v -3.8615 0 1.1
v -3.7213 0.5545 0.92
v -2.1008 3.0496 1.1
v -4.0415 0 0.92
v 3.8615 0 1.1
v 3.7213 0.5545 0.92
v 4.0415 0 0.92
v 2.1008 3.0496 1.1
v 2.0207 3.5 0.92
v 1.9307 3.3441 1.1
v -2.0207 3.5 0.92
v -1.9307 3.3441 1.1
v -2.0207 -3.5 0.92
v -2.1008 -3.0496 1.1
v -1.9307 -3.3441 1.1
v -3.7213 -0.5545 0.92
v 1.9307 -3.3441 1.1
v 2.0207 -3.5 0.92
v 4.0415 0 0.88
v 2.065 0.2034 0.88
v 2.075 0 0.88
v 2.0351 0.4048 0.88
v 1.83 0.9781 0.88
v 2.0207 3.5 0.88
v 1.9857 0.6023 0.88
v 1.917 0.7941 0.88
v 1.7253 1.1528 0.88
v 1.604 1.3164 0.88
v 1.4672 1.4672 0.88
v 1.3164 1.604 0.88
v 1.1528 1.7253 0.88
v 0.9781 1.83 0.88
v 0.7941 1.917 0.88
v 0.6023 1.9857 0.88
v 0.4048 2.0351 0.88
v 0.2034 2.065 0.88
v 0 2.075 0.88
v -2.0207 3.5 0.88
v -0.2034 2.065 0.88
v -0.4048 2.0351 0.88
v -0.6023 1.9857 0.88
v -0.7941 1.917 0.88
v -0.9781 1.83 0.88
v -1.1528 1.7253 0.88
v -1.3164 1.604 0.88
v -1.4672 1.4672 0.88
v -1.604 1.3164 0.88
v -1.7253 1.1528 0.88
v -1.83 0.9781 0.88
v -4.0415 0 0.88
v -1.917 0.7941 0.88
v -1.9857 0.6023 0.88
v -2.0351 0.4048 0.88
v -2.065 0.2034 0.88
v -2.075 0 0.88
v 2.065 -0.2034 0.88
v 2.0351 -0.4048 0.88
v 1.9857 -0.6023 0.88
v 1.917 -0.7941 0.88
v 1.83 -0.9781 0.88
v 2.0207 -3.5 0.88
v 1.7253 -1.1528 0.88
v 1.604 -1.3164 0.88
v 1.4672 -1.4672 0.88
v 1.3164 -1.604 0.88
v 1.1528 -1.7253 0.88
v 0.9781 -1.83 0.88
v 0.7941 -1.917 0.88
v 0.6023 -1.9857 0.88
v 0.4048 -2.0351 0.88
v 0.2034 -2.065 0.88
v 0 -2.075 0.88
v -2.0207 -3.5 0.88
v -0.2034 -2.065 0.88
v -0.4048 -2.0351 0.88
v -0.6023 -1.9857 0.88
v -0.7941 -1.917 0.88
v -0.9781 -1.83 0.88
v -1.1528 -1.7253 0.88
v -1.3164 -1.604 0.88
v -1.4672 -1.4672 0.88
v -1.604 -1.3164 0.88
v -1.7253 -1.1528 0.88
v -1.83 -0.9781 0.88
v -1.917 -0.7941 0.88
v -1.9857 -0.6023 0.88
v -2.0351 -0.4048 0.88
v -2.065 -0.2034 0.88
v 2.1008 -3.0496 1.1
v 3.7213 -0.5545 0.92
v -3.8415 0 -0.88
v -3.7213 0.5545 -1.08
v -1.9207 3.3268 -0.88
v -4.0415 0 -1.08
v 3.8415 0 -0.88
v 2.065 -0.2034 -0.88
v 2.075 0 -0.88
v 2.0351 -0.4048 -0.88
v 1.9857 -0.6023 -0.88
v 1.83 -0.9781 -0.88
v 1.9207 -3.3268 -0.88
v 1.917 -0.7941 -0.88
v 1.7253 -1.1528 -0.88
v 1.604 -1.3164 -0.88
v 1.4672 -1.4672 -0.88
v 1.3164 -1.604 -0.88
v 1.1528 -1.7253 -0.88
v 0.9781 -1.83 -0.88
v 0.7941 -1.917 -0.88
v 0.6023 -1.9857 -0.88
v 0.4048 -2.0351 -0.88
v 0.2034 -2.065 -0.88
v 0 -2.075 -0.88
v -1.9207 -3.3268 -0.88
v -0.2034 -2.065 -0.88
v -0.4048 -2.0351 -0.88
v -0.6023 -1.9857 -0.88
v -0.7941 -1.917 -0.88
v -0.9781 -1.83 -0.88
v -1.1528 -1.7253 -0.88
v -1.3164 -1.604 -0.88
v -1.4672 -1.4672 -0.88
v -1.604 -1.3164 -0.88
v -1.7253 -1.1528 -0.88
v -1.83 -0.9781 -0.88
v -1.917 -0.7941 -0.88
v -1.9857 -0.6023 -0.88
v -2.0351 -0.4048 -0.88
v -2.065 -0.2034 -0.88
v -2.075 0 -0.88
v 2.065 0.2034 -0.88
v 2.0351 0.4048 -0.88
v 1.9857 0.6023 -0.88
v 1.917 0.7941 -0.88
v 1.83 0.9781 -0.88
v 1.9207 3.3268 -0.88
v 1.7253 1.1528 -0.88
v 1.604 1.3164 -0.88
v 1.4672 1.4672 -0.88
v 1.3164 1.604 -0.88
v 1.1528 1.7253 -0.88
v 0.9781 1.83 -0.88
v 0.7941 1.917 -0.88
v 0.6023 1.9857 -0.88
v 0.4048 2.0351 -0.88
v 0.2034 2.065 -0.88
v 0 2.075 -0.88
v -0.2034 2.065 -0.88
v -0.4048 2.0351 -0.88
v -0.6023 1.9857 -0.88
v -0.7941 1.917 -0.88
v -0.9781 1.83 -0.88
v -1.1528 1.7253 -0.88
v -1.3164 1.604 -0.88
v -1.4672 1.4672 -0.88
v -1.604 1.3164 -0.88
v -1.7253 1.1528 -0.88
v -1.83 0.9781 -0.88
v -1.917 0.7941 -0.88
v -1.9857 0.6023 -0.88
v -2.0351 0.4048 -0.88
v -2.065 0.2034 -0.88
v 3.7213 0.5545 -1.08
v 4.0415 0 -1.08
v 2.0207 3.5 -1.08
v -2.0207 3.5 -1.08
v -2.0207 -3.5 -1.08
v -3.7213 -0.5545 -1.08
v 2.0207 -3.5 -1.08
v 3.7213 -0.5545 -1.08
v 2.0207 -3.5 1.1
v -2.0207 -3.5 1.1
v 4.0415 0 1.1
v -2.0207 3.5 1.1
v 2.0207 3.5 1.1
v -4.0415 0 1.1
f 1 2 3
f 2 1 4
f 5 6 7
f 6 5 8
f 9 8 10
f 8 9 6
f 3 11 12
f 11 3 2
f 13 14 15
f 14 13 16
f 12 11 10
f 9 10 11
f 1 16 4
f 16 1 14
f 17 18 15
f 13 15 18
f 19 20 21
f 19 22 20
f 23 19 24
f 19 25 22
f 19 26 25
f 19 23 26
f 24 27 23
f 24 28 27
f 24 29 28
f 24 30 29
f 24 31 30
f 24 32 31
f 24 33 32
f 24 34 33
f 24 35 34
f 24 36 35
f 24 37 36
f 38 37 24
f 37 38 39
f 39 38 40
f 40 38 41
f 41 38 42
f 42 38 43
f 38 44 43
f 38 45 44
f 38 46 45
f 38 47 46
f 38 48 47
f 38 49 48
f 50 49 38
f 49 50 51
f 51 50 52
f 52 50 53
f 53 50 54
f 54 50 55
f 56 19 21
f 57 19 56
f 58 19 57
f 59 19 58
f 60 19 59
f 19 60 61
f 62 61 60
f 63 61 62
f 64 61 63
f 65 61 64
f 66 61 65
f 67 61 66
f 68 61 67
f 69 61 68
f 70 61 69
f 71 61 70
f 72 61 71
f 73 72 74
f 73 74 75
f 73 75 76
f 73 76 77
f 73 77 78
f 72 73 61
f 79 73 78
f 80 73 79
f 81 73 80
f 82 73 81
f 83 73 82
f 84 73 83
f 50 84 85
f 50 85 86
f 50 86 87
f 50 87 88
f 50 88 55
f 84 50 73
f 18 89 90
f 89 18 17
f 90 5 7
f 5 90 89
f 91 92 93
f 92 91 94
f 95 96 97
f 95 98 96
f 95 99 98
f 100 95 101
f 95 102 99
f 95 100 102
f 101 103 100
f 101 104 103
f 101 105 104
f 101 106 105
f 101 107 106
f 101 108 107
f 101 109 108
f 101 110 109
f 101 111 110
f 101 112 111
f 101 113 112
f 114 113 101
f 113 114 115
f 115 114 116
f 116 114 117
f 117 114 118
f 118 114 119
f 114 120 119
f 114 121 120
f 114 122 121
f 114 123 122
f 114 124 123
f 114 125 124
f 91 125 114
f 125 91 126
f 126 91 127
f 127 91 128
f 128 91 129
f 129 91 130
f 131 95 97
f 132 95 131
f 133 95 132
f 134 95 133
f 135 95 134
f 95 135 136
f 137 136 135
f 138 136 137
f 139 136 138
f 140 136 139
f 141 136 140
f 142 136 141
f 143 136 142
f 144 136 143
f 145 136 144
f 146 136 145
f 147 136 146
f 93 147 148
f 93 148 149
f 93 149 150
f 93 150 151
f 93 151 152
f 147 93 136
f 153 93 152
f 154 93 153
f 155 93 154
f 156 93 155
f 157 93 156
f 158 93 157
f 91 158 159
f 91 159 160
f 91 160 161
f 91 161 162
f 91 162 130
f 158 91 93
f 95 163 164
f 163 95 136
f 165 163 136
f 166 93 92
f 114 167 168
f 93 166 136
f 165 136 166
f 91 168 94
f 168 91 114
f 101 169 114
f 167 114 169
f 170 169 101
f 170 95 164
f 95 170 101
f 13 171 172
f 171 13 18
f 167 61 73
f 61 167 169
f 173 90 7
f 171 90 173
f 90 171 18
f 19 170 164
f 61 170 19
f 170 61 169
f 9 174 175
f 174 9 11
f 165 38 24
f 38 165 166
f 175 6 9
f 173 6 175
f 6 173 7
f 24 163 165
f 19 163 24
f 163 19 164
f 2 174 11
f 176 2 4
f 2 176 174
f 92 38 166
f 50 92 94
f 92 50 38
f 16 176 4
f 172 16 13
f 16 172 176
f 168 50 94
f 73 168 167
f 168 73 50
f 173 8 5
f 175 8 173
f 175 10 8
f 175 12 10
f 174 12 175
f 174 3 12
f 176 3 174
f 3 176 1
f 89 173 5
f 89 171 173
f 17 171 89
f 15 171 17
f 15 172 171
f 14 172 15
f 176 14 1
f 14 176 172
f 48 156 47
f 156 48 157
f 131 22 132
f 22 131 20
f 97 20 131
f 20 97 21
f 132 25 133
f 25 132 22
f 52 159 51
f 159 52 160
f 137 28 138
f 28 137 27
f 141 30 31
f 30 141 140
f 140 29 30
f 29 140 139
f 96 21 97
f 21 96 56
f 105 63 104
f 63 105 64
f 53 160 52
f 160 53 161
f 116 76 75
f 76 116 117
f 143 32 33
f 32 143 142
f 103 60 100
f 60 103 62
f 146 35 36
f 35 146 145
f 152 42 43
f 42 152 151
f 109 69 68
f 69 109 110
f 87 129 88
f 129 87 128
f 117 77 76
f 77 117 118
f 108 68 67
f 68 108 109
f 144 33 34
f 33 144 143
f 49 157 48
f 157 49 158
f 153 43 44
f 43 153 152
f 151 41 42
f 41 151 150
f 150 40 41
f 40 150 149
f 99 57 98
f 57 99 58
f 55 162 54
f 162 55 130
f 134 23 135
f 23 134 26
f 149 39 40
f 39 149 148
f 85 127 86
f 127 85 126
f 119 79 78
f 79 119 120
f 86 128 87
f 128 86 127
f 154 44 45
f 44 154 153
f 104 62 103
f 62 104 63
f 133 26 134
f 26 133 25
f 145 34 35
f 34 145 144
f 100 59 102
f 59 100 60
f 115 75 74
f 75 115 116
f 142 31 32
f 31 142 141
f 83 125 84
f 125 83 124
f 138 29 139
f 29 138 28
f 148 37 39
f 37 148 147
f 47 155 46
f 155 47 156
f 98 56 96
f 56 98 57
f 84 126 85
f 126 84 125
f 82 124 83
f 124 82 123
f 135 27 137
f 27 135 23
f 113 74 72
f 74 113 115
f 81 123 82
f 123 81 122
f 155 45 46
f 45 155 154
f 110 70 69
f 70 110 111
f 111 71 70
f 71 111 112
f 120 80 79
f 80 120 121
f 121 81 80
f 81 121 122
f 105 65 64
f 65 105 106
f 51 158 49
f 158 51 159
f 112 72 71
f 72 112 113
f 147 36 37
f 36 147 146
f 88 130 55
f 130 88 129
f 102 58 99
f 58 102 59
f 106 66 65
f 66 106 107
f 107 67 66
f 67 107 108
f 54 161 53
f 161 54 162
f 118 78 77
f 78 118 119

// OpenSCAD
// Thin hex nut: M4 (4.0mm screw), 7.0mm across flats, 2.2mm thick

thread_nominal_diameter_mm = 4.0;   //[2.0:8.0:0.1]
across_flats_mm           = 7.0;   //[3.5:14.0:0.1]
thickness_mm              = 2.2;   //[1.1:4.4:0.1]
tolerance_mm              = 0.15;  //[0.05:0.4:0.01]
edge_chamfer_mm           = 0.2;   //[0.0:0.6:0.05]
eps_mm                    = 0.02;  //[0.01:0.2:0.01]

// Derived geometry
hex_inradius_mm      = across_flats_mm / 2;                 // center to flat
hex_circumradius_mm  = hex_inradius_mm / cos(30);           // center to corner
hole_diameter_mm     = thread_nominal_diameter_mm + tolerance_mm;

module hex_prism(h) {
    // Use built-in 6-sided cylinder; r is circumradius
    cylinder(h = h, r = hex_circumradius_mm, $fn = 6, center = true);
}

module through_hole(h) {
    cylinder(h = h, r = hole_diameter_mm/2, $fn = 64, center = true);
}

module chamfer_cut(zsign) {
    // Subtractive frustum to create a small edge chamfer on top/bottom
    // zsign = +1 (top) or -1 (bottom)
    translate([0, 0, zsign*(thickness_mm/2 - edge_chamfer_mm/2)])
        cylinder(
            h  = edge_chamfer_mm + 2*eps_mm,
            r1 = hex_circumradius_mm + 2*eps_mm,
            r2 = max(hex_circumradius_mm - edge_chamfer_mm, 0.01),
            $fn = 6,
            center = true
        );
}

difference() {
    hex_prism(thickness_mm);

    // Central through-hole
    through_hole(thickness_mm + 2*eps_mm);

    // Optional top/bottom chamfers (kept small; no protrusions)
    if (edge_chamfer_mm > 0) {
        chamfer_cut(+1);
        chamfer_cut(-1);
    }
}
